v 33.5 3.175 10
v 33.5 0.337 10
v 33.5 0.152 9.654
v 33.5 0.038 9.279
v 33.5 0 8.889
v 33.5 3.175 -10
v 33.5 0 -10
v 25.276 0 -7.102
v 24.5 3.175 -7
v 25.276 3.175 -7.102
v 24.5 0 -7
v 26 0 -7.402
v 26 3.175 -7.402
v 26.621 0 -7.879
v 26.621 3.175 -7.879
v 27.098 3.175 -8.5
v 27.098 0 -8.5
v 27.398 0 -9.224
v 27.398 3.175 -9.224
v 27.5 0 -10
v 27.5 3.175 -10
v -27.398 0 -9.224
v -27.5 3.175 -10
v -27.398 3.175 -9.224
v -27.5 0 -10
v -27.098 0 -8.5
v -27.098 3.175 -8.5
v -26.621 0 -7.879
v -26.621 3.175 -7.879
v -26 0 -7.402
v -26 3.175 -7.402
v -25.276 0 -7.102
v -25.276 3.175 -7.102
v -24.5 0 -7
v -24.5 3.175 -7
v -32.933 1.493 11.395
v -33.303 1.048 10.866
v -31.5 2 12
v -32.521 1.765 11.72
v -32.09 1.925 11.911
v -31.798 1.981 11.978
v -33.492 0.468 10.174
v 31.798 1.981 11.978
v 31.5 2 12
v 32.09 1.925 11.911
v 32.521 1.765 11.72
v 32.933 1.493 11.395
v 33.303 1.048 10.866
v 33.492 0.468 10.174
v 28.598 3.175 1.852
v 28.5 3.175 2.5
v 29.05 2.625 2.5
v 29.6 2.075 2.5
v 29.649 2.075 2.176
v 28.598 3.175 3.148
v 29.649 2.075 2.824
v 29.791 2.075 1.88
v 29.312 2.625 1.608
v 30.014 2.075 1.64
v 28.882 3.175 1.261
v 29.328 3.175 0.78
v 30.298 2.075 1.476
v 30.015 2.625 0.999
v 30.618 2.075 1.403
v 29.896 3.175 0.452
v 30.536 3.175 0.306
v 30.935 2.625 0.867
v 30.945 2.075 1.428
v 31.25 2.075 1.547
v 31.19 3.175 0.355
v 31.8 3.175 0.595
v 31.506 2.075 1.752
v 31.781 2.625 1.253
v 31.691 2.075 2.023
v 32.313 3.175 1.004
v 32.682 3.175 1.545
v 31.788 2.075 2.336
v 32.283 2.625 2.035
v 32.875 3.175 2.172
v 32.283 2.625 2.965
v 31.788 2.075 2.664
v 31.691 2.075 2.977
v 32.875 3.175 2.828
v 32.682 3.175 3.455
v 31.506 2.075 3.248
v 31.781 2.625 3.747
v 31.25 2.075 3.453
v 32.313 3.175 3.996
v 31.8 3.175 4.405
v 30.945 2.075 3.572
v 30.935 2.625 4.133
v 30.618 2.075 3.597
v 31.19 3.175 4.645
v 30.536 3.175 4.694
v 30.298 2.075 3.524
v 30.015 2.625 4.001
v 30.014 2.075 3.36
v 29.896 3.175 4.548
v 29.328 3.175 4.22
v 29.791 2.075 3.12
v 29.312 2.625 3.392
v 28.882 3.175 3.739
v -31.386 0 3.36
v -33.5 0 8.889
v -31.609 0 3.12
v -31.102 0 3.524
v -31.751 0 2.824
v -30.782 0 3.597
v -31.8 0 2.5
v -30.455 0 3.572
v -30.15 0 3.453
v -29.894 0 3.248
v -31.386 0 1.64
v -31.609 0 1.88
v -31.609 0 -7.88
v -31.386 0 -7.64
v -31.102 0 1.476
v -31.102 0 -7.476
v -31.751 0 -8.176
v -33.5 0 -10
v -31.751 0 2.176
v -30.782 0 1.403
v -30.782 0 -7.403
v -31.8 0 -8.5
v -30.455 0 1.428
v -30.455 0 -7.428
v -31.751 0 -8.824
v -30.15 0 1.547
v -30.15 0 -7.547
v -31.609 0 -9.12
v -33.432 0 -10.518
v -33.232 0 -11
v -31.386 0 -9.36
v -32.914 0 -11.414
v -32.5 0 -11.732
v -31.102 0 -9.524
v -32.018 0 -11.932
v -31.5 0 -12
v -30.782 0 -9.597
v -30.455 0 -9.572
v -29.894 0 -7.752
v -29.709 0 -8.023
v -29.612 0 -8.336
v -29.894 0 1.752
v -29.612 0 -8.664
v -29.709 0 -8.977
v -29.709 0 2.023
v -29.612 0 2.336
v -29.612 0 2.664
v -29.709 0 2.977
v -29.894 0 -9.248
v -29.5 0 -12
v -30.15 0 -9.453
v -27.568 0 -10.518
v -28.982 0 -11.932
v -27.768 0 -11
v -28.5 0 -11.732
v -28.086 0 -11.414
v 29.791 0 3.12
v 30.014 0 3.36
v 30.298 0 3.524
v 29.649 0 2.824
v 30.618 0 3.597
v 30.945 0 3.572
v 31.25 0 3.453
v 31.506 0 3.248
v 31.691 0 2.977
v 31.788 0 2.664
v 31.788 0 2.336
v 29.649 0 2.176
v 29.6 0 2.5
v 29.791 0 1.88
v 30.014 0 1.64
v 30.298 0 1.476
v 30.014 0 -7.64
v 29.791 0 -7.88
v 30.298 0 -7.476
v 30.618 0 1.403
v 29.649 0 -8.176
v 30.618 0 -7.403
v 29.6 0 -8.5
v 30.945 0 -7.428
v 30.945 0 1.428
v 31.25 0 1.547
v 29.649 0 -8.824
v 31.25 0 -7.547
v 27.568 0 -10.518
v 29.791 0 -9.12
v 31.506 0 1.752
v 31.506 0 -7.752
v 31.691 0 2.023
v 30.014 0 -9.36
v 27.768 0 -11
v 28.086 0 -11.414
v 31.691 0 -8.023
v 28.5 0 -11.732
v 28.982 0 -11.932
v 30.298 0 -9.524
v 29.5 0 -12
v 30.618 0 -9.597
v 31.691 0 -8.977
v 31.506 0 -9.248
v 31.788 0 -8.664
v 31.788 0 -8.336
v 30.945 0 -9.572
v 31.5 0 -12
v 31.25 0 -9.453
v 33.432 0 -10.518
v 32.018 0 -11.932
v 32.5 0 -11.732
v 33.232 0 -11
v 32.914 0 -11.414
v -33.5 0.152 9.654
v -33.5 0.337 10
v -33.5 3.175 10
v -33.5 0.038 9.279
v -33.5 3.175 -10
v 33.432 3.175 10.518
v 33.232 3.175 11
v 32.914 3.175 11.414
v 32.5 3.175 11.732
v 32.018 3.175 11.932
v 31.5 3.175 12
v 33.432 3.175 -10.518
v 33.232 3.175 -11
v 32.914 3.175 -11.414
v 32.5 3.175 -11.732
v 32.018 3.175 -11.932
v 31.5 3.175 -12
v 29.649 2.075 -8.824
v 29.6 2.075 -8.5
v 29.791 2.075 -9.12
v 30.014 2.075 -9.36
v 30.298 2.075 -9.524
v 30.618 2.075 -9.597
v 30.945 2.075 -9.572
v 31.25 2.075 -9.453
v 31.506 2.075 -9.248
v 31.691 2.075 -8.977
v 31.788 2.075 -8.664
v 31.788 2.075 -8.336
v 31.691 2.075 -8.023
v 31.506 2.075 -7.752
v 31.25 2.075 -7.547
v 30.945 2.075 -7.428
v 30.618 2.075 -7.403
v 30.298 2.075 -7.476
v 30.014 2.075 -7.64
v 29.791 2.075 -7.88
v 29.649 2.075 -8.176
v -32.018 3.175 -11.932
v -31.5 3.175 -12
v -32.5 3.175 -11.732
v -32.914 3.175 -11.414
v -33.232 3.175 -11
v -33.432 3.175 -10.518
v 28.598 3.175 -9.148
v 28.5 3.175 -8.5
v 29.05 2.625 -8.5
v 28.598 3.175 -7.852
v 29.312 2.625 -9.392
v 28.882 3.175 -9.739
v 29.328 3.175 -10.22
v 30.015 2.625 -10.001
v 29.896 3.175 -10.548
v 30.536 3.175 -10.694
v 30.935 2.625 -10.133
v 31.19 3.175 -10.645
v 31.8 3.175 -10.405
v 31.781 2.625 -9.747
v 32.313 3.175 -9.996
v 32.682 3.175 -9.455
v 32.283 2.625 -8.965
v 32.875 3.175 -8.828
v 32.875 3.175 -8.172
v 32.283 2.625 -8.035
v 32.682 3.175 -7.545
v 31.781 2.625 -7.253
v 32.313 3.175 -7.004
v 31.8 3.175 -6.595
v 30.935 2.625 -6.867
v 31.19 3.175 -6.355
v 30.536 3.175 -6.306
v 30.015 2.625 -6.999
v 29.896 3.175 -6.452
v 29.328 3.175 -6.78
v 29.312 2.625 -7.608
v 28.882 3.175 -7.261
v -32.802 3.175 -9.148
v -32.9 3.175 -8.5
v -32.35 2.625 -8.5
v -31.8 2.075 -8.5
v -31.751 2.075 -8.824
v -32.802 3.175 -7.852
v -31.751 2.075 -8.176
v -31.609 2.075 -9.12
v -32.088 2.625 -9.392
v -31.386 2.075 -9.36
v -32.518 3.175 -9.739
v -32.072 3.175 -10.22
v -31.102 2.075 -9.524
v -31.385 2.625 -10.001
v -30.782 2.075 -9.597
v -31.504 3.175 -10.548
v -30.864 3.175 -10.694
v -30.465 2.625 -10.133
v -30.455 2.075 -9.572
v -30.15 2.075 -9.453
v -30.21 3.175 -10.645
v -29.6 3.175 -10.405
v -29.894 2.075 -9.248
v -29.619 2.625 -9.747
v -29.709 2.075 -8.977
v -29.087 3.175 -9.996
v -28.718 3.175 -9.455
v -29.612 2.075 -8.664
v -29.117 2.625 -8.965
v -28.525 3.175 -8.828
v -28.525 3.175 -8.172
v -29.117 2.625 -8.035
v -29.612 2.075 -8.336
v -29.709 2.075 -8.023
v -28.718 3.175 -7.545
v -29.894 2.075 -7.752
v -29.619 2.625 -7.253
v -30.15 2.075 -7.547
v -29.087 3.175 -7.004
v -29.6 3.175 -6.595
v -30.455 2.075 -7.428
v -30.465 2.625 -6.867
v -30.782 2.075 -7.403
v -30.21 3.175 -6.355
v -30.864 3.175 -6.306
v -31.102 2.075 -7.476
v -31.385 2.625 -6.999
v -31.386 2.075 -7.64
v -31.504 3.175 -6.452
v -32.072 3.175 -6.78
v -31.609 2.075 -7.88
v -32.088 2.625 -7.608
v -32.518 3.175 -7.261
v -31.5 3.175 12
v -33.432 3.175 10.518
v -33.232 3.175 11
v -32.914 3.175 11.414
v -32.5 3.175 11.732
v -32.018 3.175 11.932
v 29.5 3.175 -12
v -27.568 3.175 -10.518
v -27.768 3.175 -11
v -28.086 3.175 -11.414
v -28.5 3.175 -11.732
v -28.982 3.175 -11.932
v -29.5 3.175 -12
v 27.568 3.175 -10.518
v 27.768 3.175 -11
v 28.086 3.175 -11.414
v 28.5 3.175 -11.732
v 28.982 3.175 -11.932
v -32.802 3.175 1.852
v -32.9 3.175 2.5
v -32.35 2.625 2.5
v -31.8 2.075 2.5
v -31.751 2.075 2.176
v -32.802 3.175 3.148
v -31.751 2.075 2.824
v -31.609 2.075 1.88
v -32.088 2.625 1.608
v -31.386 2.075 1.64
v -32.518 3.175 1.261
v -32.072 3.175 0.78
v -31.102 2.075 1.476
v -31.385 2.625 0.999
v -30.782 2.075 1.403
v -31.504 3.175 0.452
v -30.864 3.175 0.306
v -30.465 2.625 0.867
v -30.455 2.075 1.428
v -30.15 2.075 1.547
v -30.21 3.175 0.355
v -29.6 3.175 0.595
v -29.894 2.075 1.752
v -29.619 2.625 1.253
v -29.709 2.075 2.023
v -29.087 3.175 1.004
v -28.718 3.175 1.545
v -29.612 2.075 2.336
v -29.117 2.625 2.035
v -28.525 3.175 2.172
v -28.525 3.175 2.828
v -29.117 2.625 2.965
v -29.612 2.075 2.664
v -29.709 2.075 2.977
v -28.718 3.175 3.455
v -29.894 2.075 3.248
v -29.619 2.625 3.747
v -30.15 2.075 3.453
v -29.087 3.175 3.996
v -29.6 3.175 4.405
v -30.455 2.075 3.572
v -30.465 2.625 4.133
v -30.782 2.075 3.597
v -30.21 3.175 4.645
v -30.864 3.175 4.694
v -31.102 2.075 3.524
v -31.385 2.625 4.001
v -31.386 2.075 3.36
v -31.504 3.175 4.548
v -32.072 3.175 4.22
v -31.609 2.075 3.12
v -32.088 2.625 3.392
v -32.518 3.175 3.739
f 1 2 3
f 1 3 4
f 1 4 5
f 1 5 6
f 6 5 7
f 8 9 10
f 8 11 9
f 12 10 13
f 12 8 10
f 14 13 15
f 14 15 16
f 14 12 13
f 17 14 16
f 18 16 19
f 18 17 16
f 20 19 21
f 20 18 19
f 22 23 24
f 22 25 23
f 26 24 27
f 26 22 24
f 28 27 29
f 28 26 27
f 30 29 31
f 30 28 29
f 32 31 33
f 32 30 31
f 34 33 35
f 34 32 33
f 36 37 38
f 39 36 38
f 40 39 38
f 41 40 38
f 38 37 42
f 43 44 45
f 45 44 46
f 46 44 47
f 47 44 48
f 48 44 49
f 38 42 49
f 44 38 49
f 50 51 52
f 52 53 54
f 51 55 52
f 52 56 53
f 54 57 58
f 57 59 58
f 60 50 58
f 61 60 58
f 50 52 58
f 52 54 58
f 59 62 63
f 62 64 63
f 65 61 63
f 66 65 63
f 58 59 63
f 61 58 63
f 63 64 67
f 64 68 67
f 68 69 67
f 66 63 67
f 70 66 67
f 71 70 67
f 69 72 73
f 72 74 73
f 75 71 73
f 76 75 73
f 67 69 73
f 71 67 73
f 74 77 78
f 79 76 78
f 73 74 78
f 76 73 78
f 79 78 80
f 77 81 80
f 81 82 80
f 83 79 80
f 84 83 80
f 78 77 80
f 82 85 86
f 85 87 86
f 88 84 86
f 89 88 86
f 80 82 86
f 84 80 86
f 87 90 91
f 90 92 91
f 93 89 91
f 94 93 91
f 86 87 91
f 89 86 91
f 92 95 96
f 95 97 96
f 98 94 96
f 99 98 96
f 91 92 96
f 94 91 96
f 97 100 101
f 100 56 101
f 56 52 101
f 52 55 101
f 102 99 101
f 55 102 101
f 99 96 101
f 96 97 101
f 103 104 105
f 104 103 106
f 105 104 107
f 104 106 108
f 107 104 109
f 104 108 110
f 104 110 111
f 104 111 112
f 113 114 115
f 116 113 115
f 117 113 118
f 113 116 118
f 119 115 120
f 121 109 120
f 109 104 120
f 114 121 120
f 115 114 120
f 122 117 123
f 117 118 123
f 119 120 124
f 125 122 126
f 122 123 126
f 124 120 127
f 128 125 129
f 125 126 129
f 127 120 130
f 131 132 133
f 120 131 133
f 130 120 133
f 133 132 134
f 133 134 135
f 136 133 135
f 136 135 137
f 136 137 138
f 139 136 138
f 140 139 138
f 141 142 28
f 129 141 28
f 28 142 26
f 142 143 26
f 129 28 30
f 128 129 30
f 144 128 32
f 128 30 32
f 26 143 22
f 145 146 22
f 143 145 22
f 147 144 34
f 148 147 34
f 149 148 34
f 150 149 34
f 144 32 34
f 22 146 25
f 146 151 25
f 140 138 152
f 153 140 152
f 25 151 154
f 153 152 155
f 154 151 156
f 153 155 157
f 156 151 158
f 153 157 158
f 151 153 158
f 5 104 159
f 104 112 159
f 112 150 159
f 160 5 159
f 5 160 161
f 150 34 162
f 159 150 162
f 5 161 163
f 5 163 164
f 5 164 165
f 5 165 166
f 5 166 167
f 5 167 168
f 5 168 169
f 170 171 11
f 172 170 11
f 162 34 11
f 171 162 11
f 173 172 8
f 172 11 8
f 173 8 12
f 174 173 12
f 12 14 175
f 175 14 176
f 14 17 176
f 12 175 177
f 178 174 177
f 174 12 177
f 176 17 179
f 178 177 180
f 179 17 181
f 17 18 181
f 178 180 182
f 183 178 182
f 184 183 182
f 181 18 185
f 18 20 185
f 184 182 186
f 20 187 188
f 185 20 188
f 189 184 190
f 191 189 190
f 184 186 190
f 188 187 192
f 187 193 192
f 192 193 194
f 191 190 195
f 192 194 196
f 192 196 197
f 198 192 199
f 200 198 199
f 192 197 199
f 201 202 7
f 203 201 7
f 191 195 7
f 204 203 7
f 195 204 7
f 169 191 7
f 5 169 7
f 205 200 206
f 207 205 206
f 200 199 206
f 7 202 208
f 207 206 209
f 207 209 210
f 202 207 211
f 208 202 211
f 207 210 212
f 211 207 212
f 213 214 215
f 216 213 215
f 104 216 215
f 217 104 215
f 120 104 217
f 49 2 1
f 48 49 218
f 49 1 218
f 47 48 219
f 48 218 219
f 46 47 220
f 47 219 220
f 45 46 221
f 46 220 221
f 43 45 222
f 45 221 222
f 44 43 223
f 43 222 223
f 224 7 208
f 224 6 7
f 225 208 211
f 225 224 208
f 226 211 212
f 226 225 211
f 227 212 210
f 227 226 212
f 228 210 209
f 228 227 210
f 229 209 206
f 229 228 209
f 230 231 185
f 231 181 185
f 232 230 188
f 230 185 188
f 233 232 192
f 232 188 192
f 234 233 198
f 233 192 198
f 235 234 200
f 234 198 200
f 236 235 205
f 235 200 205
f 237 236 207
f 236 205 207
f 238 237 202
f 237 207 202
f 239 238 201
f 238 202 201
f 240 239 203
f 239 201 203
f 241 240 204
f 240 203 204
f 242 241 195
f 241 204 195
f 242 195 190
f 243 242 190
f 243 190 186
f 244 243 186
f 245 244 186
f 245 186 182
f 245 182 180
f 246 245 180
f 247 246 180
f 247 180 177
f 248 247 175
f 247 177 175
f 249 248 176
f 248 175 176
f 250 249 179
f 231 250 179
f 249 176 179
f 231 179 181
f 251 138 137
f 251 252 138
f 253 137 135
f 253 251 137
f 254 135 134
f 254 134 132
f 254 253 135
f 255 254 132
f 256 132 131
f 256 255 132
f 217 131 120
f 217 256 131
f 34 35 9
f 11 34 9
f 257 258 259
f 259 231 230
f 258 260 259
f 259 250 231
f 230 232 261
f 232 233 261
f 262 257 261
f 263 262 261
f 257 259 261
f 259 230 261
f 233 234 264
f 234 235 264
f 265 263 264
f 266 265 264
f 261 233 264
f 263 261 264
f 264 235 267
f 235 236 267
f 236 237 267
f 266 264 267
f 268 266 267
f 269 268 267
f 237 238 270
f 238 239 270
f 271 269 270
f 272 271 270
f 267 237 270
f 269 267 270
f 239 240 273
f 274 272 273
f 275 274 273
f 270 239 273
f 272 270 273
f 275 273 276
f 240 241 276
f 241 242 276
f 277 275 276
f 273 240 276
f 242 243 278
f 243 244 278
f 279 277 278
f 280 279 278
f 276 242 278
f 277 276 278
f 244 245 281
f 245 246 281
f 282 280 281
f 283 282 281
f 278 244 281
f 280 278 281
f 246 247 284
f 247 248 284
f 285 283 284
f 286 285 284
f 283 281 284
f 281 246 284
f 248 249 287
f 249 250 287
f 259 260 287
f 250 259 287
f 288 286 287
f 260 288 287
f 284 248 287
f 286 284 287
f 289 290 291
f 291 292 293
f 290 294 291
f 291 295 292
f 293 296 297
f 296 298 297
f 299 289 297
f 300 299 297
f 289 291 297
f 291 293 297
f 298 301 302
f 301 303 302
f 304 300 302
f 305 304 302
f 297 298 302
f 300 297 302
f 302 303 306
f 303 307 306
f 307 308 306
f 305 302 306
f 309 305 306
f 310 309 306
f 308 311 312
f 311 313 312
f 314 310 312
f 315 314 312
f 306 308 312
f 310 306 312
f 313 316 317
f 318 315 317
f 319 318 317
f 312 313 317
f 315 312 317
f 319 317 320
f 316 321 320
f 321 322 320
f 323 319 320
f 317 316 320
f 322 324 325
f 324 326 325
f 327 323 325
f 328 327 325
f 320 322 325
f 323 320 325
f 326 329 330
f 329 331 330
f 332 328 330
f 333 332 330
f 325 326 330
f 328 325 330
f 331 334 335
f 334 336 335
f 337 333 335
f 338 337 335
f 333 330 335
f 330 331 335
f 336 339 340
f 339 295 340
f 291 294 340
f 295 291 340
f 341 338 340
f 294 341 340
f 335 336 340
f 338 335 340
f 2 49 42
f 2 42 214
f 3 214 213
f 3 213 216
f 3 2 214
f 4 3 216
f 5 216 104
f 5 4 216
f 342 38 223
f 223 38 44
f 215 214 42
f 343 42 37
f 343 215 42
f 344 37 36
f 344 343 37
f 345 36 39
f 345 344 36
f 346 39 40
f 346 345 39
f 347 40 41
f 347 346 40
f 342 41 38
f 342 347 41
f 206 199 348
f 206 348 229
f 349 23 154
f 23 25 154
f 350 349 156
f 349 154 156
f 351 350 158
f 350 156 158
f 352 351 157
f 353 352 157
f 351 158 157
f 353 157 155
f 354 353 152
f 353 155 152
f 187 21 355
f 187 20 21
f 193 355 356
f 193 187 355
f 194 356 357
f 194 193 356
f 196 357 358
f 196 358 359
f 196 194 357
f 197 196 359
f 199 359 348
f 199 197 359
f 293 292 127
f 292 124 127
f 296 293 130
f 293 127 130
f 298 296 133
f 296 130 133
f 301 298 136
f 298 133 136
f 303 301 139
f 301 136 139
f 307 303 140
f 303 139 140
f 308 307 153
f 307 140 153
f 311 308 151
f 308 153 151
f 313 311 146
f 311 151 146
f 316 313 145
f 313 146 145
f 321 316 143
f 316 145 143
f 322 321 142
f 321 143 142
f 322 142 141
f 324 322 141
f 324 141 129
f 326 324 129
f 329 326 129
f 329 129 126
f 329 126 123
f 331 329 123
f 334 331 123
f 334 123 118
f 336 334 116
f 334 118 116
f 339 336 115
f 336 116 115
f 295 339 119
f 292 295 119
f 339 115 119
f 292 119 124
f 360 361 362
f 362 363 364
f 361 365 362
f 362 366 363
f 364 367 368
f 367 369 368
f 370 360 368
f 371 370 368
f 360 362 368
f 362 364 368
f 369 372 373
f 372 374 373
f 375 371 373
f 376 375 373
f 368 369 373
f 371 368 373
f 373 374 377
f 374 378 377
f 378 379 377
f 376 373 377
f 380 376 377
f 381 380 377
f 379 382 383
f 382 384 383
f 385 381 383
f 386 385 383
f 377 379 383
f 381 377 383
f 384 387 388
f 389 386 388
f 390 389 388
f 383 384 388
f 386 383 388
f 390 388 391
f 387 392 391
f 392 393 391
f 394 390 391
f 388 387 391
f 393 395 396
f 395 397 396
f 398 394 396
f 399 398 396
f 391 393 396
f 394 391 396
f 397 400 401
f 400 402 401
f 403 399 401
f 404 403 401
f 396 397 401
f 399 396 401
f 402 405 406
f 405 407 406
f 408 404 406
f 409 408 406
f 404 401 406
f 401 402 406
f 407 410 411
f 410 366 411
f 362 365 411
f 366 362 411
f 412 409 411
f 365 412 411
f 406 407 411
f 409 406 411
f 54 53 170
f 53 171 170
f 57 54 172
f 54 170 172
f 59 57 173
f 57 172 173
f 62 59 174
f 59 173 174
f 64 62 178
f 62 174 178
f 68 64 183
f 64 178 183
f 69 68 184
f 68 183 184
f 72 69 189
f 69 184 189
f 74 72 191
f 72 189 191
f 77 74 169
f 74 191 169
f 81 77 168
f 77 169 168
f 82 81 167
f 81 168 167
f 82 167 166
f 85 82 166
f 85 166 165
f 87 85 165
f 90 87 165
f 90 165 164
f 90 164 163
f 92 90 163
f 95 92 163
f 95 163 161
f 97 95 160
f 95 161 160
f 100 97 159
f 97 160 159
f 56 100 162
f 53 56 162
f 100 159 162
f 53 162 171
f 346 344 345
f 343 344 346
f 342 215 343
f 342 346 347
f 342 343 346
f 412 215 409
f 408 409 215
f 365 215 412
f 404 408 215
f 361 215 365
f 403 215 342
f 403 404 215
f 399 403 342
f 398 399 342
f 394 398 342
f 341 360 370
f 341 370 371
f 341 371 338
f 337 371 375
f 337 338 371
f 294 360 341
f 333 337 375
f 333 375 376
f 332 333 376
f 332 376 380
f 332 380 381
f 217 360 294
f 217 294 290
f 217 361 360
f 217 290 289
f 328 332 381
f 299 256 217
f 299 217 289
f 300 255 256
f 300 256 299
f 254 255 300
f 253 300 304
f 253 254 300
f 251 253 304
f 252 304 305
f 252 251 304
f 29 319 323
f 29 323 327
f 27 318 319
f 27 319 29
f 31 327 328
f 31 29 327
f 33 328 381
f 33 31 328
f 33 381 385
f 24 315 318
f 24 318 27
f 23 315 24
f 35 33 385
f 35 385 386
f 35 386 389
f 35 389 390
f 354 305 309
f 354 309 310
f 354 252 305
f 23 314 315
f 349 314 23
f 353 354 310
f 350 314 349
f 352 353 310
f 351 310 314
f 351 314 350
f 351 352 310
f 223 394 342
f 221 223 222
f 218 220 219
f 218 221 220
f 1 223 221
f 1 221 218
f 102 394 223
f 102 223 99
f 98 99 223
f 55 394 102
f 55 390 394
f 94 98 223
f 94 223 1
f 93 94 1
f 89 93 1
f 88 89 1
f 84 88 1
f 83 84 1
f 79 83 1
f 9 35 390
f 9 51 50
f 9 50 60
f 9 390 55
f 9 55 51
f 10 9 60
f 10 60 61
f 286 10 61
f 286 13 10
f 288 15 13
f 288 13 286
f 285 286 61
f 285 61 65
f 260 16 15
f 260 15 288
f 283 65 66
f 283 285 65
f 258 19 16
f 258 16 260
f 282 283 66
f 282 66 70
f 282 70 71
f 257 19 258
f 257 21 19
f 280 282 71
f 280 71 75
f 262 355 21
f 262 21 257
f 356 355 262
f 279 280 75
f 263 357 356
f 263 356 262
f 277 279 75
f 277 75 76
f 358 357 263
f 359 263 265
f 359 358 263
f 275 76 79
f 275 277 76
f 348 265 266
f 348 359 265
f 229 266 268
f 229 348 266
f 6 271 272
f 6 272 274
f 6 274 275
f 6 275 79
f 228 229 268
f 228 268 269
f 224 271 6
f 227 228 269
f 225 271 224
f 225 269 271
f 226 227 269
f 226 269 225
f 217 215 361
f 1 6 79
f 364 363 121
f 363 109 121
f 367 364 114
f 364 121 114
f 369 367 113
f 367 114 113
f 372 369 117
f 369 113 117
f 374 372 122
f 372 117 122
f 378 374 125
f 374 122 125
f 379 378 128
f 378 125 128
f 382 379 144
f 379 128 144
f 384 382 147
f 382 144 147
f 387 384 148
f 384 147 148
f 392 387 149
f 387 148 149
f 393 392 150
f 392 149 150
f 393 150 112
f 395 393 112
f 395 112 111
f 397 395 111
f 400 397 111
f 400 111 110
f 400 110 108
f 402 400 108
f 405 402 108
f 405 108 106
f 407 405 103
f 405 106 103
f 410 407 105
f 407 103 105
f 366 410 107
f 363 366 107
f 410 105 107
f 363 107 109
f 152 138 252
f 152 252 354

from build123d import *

# Parameters (mm, degrees)
SKETCH1_W                                       = 67
SKETCH1_H                                       = 24
BOSS_EXTRUDE1_DEPTH                             = 3.175
CSK_FOR_M2_FLAT_HEAD_MACHINE_SCREW1_D           = 2.2
CSK_FOR_M2_FLAT_HEAD_MACHINE_SCREW1_CSINK_D     = 4.4
CSK_FOR_M2_FLAT_HEAD_MACHINE_SCREW1_CSINK_ANGLE = 90
CHAMFER1_SIZE                                   = 2
CHAMFER1_SIZE2                                  = 2.383507185
SKETCH4_W                                       = 55
SKETCH4_H                                       = 10
CUT_EXTRUDE1_DEPTH                              = 36.725769761
FILLET2_R                                       = 2
FILLET4_R                                       = 3
FILLET5_R                                       = 2


with BuildPart() as part:
    # Sketch1 → Boss-Extrude1 (new body)
    with BuildSketch(Plane(origin=(0, 0, 0), x_dir=(1, 0, 0), z_dir=(0, 1, 0))):
        Rectangle(SKETCH1_W, SKETCH1_H)
    extrude(amount=BOSS_EXTRUDE1_DEPTH)

    # CSK for M2 Flat Head Machine Screw1 (through all)
    with Locations(Plane(origin=(0, 3.175, 0), x_dir=(1, 0, 0), z_dir=(0, 1, 0))):
        with Locations((-30.7, 8.5), (-30.7, -2.5), (30.7, -2.5), (30.7, 8.5)):
            CounterSinkHole(CSK_FOR_M2_FLAT_HEAD_MACHINE_SCREW1_D / 2, CSK_FOR_M2_FLAT_HEAD_MACHINE_SCREW1_CSINK_D / 2, counter_sink_angle=CSK_FOR_M2_FLAT_HEAD_MACHINE_SCREW1_CSINK_ANGLE)

    # Chamfer1
    chamfer1_edges = [part.edges().sort_by_distance(p)[0] for p in [
        (0, 0, 12),
    ]]
    chamfer1_side = [part.faces().sort_by_distance(p)[0] for p in [
        (0, 1.5875, 12),
    ]]
    chamfer(chamfer1_edges, length=CHAMFER1_SIZE, length2=CHAMFER1_SIZE2, reference=chamfer1_side[0])

    # Sketch4 → Cut-Extrude1 (cut, through all)
    with BuildSketch(Plane(origin=(0, 3.175, 0), x_dir=(1, 0, 0), z_dir=(0, 1, 0))):
        with Locations((0, 12)):
            Rectangle(SKETCH4_W, SKETCH4_H)
    extrude(amount=-CUT_EXTRUDE1_DEPTH, mode=Mode.SUBTRACT)

    # Fillet2
    fillet2_edges = [part.edges().sort_by_distance(p)[0] for p in [
        (0, 0, 9.616492815),
    ]]
    fillet(fillet2_edges, radius=FILLET2_R)

    # Fillet4
    fillet4_edges = [part.edges().sort_by_distance(p)[0] for p in [
        (-27.5, 1.5875, -7),
        (27.5, 1.5875, -7),
    ]]
    fillet(fillet4_edges, radius=FILLET4_R)

    # Fillet5
    fillet5_edges = [part.edges().sort_by_distance(p)[0] for p in [
        (33.5, 1.5875, -12),
        (33.5, 2.5875, 12),
        (-33.5, 2.5875, 12),
        (-27.5, 1.5875, -12),
        (27.5, 1.5875, -12),
        (-33.5, 1.5875, -12),
    ]]
    fillet(fillet5_edges, radius=FILLET5_R - 0.0001)  # a hair under: the kernel refuses the full size


solid = part.part
